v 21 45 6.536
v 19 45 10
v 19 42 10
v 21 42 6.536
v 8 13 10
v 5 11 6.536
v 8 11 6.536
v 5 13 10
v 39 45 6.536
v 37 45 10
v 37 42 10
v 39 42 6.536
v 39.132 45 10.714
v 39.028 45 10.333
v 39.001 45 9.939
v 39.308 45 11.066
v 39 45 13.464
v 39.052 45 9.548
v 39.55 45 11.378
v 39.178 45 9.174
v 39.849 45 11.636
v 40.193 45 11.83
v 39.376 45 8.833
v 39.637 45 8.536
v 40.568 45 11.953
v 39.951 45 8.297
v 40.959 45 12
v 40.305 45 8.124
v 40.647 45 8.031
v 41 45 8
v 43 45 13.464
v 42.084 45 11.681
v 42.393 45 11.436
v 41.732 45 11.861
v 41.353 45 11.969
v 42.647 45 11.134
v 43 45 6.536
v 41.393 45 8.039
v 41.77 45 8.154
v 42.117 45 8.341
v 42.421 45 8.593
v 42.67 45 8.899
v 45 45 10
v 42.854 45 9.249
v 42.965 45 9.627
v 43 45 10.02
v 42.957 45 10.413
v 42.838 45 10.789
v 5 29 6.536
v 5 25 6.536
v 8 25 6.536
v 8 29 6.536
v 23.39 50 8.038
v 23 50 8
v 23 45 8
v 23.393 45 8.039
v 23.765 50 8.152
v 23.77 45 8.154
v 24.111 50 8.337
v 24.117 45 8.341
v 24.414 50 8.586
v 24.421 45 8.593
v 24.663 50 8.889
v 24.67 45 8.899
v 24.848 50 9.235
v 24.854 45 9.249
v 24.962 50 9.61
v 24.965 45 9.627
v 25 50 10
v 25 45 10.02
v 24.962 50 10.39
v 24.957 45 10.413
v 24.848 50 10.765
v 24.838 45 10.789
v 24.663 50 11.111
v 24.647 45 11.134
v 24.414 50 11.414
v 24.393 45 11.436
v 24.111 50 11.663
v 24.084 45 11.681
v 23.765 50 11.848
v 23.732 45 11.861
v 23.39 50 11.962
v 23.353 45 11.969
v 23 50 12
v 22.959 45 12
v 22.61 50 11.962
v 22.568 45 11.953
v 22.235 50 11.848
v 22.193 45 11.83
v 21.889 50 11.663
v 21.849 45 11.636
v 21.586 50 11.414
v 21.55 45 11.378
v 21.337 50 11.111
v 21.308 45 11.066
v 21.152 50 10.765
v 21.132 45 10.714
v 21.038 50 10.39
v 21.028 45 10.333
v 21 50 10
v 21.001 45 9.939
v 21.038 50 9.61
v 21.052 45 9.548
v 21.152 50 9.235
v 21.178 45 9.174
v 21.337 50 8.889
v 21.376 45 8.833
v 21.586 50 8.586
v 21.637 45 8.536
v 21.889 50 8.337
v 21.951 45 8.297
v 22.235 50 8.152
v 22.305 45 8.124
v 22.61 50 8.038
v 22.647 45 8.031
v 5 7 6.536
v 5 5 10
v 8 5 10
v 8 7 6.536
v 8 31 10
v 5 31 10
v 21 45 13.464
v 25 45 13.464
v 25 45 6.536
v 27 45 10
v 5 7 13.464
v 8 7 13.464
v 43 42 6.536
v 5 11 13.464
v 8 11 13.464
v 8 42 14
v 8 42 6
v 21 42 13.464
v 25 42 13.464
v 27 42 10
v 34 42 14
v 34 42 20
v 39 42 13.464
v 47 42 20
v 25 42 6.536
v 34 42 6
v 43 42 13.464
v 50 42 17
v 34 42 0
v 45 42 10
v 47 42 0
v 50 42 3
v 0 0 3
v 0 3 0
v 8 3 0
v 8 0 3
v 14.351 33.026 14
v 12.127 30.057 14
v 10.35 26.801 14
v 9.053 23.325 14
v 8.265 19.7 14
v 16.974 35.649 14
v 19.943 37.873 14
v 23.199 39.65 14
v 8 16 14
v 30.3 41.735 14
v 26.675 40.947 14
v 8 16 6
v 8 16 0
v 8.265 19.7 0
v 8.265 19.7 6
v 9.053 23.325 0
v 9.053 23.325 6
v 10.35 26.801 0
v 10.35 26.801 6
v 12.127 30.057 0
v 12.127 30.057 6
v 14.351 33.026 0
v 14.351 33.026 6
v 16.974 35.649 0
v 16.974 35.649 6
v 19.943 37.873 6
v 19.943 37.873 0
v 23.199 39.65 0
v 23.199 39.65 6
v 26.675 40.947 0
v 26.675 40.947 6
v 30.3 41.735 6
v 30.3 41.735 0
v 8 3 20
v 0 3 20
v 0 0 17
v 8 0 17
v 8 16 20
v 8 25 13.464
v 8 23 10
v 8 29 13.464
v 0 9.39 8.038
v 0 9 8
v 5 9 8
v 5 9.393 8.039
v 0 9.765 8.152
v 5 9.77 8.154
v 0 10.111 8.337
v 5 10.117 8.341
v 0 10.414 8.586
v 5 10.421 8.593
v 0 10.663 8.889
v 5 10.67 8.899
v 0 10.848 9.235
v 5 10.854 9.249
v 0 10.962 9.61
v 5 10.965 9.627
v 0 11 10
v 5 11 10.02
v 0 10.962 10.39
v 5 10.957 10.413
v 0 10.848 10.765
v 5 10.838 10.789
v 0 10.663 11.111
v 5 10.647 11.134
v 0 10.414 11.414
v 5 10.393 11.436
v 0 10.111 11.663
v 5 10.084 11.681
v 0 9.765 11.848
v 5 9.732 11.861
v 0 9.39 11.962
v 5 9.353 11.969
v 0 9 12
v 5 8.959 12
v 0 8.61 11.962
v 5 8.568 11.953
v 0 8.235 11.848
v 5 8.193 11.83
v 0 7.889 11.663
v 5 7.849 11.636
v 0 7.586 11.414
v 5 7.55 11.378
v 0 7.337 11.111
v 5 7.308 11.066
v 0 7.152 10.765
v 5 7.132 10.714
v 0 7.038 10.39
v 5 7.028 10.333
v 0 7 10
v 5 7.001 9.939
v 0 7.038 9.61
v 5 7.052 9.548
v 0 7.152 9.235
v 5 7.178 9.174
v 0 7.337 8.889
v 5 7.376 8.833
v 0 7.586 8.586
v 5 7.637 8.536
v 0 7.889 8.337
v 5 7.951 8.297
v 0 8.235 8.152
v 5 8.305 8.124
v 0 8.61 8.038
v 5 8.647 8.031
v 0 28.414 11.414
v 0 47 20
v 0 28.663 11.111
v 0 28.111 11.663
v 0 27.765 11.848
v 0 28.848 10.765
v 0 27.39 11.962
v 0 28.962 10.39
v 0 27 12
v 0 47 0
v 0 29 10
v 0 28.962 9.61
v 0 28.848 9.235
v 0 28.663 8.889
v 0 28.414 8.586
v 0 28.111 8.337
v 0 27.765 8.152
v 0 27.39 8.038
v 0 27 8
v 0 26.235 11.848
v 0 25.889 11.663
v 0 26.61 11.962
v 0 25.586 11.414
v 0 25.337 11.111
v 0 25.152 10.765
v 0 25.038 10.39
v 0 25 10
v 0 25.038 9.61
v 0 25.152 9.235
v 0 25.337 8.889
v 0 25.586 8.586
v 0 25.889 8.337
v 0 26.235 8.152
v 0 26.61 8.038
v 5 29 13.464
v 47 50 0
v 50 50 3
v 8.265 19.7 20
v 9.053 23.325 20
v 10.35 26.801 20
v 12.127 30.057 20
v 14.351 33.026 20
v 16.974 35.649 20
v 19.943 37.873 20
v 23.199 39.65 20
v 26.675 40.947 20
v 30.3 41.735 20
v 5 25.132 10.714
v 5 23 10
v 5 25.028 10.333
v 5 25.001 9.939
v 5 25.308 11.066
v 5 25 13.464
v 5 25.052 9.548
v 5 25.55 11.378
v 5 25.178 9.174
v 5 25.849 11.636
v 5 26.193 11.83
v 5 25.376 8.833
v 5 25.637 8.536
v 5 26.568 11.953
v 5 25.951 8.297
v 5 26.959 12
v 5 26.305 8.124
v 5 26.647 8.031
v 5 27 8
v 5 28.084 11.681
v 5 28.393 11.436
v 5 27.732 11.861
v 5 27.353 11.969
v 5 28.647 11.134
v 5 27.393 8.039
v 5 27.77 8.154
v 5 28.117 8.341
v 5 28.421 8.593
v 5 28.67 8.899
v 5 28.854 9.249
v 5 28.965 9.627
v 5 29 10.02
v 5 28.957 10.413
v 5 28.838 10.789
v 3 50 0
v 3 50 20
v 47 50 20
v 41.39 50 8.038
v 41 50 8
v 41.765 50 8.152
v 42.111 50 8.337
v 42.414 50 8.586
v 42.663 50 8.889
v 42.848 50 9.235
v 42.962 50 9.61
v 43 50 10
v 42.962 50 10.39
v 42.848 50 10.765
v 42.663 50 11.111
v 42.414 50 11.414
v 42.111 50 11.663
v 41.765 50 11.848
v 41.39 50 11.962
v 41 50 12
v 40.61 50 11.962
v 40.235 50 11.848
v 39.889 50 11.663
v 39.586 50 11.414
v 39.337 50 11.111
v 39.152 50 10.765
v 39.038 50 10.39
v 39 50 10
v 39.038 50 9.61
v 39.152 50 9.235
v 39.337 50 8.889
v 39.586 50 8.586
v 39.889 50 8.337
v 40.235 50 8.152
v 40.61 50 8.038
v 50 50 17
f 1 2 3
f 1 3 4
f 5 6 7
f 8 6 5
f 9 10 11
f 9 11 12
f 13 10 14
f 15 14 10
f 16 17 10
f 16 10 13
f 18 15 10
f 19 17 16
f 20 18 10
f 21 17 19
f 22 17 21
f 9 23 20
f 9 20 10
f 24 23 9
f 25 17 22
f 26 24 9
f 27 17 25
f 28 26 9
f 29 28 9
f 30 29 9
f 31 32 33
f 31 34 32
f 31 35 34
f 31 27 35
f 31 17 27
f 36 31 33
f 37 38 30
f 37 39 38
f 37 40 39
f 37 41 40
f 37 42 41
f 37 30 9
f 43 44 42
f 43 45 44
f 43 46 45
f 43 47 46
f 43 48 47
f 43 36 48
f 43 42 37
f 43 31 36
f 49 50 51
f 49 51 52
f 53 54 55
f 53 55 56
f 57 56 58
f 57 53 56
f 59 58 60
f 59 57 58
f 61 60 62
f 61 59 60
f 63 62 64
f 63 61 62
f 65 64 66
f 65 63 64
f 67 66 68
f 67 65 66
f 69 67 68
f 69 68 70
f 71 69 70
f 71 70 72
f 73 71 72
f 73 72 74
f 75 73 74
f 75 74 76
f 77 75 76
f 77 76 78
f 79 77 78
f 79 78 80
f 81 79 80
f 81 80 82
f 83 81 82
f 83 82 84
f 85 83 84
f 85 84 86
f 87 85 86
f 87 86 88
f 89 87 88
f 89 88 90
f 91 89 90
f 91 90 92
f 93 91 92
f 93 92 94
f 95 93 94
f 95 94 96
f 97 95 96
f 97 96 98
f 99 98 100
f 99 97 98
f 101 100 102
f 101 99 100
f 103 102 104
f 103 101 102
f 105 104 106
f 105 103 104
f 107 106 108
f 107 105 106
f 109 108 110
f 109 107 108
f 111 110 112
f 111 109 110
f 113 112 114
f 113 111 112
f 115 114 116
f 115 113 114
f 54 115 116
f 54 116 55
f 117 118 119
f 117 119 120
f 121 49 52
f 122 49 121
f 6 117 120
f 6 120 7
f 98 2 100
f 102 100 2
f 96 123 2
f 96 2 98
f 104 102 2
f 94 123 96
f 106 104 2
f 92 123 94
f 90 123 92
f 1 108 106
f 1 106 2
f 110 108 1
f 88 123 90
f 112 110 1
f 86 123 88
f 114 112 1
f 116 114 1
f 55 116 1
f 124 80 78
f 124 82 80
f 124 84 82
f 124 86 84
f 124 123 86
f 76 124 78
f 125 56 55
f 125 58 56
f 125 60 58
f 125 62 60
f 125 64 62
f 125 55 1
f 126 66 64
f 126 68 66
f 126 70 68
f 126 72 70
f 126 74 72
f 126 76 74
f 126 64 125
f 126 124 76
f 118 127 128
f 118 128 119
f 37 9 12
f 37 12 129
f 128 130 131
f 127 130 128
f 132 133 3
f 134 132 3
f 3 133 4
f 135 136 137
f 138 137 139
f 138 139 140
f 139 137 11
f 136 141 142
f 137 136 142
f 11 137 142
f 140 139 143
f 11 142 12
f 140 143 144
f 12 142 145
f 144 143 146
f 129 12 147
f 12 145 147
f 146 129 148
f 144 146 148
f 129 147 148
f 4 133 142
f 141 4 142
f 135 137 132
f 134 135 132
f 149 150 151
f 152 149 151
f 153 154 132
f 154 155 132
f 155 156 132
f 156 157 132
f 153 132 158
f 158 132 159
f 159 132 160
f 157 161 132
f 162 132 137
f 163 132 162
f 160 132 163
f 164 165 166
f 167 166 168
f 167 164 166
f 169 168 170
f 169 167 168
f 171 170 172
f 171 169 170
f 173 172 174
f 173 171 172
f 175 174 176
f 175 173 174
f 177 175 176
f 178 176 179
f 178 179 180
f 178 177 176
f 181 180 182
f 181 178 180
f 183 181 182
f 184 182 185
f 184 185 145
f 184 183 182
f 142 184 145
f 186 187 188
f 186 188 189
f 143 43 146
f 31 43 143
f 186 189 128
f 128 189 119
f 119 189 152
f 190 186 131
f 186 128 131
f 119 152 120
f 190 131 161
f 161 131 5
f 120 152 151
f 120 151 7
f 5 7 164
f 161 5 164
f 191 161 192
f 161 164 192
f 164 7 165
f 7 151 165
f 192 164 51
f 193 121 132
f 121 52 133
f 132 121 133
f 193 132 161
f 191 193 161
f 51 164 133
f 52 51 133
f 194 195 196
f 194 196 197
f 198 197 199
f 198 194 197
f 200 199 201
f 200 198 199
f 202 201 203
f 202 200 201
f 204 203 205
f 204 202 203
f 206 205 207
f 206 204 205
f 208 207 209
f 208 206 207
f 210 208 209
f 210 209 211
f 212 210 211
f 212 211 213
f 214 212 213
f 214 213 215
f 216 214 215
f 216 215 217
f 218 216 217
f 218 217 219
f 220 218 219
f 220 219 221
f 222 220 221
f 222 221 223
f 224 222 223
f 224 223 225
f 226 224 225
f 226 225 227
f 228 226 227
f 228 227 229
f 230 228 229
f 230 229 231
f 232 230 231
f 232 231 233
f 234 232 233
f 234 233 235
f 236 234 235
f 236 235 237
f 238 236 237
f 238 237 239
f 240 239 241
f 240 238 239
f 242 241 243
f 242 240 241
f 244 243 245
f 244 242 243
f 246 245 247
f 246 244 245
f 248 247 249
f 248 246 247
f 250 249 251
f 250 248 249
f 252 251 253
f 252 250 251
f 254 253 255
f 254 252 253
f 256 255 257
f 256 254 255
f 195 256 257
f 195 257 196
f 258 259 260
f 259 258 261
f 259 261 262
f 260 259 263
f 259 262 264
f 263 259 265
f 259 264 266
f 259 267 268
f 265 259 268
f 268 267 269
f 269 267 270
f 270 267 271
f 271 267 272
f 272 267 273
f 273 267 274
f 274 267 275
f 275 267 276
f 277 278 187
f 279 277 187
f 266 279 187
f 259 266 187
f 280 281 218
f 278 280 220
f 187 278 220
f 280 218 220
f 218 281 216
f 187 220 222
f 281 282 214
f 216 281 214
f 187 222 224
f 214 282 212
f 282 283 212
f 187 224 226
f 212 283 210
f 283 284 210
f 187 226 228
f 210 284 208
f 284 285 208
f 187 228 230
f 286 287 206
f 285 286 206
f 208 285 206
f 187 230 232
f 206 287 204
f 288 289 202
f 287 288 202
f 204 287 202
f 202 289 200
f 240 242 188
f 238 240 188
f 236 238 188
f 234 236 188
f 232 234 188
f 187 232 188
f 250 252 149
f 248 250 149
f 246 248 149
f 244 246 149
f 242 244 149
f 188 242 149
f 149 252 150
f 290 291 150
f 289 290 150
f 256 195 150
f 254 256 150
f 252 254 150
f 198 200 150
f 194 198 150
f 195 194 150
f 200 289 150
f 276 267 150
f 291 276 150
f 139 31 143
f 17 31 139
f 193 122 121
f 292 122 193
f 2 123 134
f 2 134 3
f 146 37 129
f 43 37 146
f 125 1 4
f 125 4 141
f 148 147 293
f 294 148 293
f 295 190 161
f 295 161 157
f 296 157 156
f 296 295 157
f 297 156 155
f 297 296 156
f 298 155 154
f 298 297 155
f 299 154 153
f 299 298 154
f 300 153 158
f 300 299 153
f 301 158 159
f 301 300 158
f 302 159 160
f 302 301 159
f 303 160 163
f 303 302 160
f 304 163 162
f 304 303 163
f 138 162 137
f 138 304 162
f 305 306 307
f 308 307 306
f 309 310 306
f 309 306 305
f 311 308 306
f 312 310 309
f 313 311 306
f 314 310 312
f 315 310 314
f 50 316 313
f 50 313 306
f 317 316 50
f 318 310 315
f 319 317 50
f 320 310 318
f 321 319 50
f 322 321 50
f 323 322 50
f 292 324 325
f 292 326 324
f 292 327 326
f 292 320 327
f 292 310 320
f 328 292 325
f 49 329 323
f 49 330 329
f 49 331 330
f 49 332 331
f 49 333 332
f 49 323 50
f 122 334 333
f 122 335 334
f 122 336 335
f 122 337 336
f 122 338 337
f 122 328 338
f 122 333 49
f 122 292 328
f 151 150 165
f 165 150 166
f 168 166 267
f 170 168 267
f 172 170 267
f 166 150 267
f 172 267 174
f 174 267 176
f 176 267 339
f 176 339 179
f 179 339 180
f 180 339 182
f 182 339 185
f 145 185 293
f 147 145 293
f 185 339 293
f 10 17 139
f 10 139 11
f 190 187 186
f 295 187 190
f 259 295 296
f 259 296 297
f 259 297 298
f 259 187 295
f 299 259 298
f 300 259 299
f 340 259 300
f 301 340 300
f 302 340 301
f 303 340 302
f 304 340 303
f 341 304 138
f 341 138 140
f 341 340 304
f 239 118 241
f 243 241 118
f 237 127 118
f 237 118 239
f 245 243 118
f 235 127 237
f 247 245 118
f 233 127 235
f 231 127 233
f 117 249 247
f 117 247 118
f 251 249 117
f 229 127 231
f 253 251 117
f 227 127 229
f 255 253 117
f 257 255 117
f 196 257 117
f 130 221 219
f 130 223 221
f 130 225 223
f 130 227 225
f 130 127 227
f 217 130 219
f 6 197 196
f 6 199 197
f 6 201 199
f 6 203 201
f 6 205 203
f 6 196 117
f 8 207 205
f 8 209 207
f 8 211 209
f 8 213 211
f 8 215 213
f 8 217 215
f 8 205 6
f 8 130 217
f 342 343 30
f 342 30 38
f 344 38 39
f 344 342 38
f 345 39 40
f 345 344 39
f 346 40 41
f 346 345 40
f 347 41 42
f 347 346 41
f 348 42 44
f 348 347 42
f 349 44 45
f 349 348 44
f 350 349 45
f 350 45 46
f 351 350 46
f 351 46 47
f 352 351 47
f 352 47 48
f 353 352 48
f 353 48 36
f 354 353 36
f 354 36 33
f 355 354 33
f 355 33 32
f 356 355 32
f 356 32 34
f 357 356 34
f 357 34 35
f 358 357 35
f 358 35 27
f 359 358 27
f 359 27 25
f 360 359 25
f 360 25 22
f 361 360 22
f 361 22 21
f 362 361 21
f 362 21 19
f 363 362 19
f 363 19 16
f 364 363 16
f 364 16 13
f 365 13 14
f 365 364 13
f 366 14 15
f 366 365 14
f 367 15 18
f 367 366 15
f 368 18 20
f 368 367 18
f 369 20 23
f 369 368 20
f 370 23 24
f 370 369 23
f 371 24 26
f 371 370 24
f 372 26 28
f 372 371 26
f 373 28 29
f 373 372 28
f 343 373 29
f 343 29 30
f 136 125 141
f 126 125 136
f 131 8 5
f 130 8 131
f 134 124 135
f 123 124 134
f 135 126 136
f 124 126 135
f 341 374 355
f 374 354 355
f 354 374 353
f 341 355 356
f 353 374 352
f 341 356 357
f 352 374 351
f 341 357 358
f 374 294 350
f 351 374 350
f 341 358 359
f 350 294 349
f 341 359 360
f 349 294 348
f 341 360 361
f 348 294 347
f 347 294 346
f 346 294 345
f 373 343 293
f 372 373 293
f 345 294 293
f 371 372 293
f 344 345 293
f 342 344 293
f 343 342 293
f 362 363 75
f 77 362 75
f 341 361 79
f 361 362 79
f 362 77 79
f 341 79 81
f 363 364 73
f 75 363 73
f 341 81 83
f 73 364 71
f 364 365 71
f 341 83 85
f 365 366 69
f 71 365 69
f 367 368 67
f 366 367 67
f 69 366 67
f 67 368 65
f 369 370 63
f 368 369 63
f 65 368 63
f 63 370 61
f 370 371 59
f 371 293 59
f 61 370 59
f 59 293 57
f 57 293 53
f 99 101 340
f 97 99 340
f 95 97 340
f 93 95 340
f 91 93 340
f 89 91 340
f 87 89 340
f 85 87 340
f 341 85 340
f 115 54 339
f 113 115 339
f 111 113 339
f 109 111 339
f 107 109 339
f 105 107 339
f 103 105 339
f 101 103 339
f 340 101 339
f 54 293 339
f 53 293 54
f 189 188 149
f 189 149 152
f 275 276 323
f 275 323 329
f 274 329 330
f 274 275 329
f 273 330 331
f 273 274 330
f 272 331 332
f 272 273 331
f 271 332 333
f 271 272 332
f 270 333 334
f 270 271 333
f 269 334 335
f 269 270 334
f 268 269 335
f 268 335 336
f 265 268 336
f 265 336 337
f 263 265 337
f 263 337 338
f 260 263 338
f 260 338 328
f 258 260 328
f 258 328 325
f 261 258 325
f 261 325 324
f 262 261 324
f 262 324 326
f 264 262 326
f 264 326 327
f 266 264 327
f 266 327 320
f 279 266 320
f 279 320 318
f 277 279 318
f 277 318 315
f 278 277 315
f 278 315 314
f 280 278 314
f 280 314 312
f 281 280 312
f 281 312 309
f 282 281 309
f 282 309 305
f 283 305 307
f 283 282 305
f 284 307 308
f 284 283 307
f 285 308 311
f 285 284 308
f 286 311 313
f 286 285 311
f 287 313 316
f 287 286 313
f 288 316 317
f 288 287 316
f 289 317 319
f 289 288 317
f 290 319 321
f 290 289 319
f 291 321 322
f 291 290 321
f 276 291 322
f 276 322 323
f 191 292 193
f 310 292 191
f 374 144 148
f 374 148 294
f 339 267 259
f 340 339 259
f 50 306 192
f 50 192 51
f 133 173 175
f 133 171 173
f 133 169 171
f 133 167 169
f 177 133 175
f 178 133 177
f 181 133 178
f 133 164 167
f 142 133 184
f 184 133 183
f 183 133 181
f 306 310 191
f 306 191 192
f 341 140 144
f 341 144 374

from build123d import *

# Parameters (mm, degrees)
PRISM001_DEPTH            = 14
PRISM001_ROLL_ANGLE       = 90.000052
PRISM001_PITCH_ANGLE      = 59.999967
PRISM001_PLACEMENT_ANGLE  = 90.000052
CYLINDER_R                = 2
CYLINDER_DEPTH            = 20
CYLINDER_PITCH_ANGLE      = 90
FUSION002_PLACEMENT_ANGLE = -90
FUSION003_PLACEMENT_ANGLE = -90
BOX_W                     = 36
BOX_H                     = 38
BOX_DEPTH                 = 8
PAD_DEPTH                 = 20
CHAMFER_SIZE              = 3
FILLET_R                  = 26


with BuildPart() as prism001:
    # Prism001 → Prism001 (new body)
    with BuildSketch(Plane.XY):
        Polygon((4, 0), (2, 3.464102), (-2, 3.464102), (-4, 0), (-2, -3.464102), (2, -3.464102), align=None)
    extrude(amount=PRISM001_DEPTH)


with BuildPart() as prism001_1:
    # Prism001 roll: moved
    add(prism001.part.rotate(Axis((0, 0, 0), (1, 0, 0)), PRISM001_ROLL_ANGLE))


with BuildPart() as prism001_2:
    # Prism001 pitch: moved
    add(prism001_1.part.rotate(Axis((0, 0, 0), (0, 1, 0)), PRISM001_PITCH_ANGLE))


with BuildPart() as prism001_3:
    # Prism001 placement: moved
    add(prism001_2.part.moved(Location((5, 9, 10))).rotate(Axis((5, 9, 10), (0, 0, 1)), PRISM001_PLACEMENT_ANGLE))


with BuildPart() as cylinder:
    # Cylinder → Cylinder (new body)
    with BuildSketch(Plane.XY):
        Circle(CYLINDER_R)
    extrude(amount=CYLINDER_DEPTH)


with BuildPart() as cylinder_1:
    # Cylinder pitch: moved
    add(cylinder.part.rotate(Axis((0, 0, 0), (0, 1, 0)), CYLINDER_PITCH_ANGLE))


with BuildPart() as cylinder_2:
    # Cylinder placement: moved
    add(cylinder_1.part.moved(Location((-3, 9, 10))))


with BuildPart() as fusion002:
    # Fusion002 base: copy of Cylinder
    add(cylinder_2.part)

    # Fusion002: union Prism001
    add(prism001_3.part)


with BuildPart() as fusion002_1:
    # Fusion002 placement: moved
    add(fusion002.part.moved(Location((14, 50, 0))).rotate(Axis((14, 50, 0), (0, 0, 1)), FUSION002_PLACEMENT_ANGLE))


with BuildPart() as fusion:
    # Fusion base: copy of Cylinder
    add(cylinder_2.part)

    # Fusion: union Prism001
    add(prism001_3.part)


with BuildPart() as fusion_1:
    # Fusion placement: moved
    add(fusion.part.moved(Location((0, 18, 0))))


with BuildPart() as fusion001:
    # Fusion001 base: copy of Cylinder
    add(cylinder_2.part)

    # Fusion001: union Prism001
    add(prism001_3.part)


with BuildPart() as fusion004:
    # Fusion003 base: copy of Cylinder
    add(cylinder_2.part)

    # Fusion003: union Prism001
    add(prism001_3.part)


with BuildPart() as fusion004_1:
    # Fusion003 placement: moved
    add(fusion004.part.moved(Location((32, 50, 0))).rotate(Axis((32, 50, 0), (0, 0, 1)), FUSION003_PLACEMENT_ANGLE))

    # Fusion004: union Fusion002, Fusion, Fusion001
    add(fusion002_1.part)
    add(fusion_1.part)
    add(fusion001.part)


with BuildPart() as cube:
    # Box → Box (new body)
    with BuildSketch(Plane(origin=(8, 4, 6), x_dir=(1, 0, 0), z_dir=(0, 0, 1))):
        with Locations((18, 19)):
            Rectangle(BOX_W, BOX_H)
    extrude(amount=BOX_DEPTH)


with BuildPart() as cut001:
    # Sketch → Pad (new body)
    with BuildSketch(Plane.XY):
        Polygon((0, 0), (8, 0), (8, 42), (50, 42), (50, 50), (0, 50), align=None)
    extrude(amount=PAD_DEPTH)

    # Chamfer
    chamfer_edges = [cut001.edges().sort_by_distance(p)[0] for p in [
        (4, 0, 0),
        (4, 0, 20),
        (50, 46, 0),
        (50, 46, 20),
        (0, 50, 10),
    ]]
    chamfer(chamfer_edges, length=CHAMFER_SIZE)

    # Fillet
    fillet_edges = [cut001.edges().sort_by_distance(p)[0] for p in [
        (8, 42, 10),
    ]]
    fillet(fillet_edges, radius=FILLET_R)

    # Cut: cut Cube
    add(cube.part, mode=Mode.SUBTRACT)

    # Cut001: cut Fusion004
    add(fusion004_1.part, mode=Mode.SUBTRACT)


solid = cut001.part
